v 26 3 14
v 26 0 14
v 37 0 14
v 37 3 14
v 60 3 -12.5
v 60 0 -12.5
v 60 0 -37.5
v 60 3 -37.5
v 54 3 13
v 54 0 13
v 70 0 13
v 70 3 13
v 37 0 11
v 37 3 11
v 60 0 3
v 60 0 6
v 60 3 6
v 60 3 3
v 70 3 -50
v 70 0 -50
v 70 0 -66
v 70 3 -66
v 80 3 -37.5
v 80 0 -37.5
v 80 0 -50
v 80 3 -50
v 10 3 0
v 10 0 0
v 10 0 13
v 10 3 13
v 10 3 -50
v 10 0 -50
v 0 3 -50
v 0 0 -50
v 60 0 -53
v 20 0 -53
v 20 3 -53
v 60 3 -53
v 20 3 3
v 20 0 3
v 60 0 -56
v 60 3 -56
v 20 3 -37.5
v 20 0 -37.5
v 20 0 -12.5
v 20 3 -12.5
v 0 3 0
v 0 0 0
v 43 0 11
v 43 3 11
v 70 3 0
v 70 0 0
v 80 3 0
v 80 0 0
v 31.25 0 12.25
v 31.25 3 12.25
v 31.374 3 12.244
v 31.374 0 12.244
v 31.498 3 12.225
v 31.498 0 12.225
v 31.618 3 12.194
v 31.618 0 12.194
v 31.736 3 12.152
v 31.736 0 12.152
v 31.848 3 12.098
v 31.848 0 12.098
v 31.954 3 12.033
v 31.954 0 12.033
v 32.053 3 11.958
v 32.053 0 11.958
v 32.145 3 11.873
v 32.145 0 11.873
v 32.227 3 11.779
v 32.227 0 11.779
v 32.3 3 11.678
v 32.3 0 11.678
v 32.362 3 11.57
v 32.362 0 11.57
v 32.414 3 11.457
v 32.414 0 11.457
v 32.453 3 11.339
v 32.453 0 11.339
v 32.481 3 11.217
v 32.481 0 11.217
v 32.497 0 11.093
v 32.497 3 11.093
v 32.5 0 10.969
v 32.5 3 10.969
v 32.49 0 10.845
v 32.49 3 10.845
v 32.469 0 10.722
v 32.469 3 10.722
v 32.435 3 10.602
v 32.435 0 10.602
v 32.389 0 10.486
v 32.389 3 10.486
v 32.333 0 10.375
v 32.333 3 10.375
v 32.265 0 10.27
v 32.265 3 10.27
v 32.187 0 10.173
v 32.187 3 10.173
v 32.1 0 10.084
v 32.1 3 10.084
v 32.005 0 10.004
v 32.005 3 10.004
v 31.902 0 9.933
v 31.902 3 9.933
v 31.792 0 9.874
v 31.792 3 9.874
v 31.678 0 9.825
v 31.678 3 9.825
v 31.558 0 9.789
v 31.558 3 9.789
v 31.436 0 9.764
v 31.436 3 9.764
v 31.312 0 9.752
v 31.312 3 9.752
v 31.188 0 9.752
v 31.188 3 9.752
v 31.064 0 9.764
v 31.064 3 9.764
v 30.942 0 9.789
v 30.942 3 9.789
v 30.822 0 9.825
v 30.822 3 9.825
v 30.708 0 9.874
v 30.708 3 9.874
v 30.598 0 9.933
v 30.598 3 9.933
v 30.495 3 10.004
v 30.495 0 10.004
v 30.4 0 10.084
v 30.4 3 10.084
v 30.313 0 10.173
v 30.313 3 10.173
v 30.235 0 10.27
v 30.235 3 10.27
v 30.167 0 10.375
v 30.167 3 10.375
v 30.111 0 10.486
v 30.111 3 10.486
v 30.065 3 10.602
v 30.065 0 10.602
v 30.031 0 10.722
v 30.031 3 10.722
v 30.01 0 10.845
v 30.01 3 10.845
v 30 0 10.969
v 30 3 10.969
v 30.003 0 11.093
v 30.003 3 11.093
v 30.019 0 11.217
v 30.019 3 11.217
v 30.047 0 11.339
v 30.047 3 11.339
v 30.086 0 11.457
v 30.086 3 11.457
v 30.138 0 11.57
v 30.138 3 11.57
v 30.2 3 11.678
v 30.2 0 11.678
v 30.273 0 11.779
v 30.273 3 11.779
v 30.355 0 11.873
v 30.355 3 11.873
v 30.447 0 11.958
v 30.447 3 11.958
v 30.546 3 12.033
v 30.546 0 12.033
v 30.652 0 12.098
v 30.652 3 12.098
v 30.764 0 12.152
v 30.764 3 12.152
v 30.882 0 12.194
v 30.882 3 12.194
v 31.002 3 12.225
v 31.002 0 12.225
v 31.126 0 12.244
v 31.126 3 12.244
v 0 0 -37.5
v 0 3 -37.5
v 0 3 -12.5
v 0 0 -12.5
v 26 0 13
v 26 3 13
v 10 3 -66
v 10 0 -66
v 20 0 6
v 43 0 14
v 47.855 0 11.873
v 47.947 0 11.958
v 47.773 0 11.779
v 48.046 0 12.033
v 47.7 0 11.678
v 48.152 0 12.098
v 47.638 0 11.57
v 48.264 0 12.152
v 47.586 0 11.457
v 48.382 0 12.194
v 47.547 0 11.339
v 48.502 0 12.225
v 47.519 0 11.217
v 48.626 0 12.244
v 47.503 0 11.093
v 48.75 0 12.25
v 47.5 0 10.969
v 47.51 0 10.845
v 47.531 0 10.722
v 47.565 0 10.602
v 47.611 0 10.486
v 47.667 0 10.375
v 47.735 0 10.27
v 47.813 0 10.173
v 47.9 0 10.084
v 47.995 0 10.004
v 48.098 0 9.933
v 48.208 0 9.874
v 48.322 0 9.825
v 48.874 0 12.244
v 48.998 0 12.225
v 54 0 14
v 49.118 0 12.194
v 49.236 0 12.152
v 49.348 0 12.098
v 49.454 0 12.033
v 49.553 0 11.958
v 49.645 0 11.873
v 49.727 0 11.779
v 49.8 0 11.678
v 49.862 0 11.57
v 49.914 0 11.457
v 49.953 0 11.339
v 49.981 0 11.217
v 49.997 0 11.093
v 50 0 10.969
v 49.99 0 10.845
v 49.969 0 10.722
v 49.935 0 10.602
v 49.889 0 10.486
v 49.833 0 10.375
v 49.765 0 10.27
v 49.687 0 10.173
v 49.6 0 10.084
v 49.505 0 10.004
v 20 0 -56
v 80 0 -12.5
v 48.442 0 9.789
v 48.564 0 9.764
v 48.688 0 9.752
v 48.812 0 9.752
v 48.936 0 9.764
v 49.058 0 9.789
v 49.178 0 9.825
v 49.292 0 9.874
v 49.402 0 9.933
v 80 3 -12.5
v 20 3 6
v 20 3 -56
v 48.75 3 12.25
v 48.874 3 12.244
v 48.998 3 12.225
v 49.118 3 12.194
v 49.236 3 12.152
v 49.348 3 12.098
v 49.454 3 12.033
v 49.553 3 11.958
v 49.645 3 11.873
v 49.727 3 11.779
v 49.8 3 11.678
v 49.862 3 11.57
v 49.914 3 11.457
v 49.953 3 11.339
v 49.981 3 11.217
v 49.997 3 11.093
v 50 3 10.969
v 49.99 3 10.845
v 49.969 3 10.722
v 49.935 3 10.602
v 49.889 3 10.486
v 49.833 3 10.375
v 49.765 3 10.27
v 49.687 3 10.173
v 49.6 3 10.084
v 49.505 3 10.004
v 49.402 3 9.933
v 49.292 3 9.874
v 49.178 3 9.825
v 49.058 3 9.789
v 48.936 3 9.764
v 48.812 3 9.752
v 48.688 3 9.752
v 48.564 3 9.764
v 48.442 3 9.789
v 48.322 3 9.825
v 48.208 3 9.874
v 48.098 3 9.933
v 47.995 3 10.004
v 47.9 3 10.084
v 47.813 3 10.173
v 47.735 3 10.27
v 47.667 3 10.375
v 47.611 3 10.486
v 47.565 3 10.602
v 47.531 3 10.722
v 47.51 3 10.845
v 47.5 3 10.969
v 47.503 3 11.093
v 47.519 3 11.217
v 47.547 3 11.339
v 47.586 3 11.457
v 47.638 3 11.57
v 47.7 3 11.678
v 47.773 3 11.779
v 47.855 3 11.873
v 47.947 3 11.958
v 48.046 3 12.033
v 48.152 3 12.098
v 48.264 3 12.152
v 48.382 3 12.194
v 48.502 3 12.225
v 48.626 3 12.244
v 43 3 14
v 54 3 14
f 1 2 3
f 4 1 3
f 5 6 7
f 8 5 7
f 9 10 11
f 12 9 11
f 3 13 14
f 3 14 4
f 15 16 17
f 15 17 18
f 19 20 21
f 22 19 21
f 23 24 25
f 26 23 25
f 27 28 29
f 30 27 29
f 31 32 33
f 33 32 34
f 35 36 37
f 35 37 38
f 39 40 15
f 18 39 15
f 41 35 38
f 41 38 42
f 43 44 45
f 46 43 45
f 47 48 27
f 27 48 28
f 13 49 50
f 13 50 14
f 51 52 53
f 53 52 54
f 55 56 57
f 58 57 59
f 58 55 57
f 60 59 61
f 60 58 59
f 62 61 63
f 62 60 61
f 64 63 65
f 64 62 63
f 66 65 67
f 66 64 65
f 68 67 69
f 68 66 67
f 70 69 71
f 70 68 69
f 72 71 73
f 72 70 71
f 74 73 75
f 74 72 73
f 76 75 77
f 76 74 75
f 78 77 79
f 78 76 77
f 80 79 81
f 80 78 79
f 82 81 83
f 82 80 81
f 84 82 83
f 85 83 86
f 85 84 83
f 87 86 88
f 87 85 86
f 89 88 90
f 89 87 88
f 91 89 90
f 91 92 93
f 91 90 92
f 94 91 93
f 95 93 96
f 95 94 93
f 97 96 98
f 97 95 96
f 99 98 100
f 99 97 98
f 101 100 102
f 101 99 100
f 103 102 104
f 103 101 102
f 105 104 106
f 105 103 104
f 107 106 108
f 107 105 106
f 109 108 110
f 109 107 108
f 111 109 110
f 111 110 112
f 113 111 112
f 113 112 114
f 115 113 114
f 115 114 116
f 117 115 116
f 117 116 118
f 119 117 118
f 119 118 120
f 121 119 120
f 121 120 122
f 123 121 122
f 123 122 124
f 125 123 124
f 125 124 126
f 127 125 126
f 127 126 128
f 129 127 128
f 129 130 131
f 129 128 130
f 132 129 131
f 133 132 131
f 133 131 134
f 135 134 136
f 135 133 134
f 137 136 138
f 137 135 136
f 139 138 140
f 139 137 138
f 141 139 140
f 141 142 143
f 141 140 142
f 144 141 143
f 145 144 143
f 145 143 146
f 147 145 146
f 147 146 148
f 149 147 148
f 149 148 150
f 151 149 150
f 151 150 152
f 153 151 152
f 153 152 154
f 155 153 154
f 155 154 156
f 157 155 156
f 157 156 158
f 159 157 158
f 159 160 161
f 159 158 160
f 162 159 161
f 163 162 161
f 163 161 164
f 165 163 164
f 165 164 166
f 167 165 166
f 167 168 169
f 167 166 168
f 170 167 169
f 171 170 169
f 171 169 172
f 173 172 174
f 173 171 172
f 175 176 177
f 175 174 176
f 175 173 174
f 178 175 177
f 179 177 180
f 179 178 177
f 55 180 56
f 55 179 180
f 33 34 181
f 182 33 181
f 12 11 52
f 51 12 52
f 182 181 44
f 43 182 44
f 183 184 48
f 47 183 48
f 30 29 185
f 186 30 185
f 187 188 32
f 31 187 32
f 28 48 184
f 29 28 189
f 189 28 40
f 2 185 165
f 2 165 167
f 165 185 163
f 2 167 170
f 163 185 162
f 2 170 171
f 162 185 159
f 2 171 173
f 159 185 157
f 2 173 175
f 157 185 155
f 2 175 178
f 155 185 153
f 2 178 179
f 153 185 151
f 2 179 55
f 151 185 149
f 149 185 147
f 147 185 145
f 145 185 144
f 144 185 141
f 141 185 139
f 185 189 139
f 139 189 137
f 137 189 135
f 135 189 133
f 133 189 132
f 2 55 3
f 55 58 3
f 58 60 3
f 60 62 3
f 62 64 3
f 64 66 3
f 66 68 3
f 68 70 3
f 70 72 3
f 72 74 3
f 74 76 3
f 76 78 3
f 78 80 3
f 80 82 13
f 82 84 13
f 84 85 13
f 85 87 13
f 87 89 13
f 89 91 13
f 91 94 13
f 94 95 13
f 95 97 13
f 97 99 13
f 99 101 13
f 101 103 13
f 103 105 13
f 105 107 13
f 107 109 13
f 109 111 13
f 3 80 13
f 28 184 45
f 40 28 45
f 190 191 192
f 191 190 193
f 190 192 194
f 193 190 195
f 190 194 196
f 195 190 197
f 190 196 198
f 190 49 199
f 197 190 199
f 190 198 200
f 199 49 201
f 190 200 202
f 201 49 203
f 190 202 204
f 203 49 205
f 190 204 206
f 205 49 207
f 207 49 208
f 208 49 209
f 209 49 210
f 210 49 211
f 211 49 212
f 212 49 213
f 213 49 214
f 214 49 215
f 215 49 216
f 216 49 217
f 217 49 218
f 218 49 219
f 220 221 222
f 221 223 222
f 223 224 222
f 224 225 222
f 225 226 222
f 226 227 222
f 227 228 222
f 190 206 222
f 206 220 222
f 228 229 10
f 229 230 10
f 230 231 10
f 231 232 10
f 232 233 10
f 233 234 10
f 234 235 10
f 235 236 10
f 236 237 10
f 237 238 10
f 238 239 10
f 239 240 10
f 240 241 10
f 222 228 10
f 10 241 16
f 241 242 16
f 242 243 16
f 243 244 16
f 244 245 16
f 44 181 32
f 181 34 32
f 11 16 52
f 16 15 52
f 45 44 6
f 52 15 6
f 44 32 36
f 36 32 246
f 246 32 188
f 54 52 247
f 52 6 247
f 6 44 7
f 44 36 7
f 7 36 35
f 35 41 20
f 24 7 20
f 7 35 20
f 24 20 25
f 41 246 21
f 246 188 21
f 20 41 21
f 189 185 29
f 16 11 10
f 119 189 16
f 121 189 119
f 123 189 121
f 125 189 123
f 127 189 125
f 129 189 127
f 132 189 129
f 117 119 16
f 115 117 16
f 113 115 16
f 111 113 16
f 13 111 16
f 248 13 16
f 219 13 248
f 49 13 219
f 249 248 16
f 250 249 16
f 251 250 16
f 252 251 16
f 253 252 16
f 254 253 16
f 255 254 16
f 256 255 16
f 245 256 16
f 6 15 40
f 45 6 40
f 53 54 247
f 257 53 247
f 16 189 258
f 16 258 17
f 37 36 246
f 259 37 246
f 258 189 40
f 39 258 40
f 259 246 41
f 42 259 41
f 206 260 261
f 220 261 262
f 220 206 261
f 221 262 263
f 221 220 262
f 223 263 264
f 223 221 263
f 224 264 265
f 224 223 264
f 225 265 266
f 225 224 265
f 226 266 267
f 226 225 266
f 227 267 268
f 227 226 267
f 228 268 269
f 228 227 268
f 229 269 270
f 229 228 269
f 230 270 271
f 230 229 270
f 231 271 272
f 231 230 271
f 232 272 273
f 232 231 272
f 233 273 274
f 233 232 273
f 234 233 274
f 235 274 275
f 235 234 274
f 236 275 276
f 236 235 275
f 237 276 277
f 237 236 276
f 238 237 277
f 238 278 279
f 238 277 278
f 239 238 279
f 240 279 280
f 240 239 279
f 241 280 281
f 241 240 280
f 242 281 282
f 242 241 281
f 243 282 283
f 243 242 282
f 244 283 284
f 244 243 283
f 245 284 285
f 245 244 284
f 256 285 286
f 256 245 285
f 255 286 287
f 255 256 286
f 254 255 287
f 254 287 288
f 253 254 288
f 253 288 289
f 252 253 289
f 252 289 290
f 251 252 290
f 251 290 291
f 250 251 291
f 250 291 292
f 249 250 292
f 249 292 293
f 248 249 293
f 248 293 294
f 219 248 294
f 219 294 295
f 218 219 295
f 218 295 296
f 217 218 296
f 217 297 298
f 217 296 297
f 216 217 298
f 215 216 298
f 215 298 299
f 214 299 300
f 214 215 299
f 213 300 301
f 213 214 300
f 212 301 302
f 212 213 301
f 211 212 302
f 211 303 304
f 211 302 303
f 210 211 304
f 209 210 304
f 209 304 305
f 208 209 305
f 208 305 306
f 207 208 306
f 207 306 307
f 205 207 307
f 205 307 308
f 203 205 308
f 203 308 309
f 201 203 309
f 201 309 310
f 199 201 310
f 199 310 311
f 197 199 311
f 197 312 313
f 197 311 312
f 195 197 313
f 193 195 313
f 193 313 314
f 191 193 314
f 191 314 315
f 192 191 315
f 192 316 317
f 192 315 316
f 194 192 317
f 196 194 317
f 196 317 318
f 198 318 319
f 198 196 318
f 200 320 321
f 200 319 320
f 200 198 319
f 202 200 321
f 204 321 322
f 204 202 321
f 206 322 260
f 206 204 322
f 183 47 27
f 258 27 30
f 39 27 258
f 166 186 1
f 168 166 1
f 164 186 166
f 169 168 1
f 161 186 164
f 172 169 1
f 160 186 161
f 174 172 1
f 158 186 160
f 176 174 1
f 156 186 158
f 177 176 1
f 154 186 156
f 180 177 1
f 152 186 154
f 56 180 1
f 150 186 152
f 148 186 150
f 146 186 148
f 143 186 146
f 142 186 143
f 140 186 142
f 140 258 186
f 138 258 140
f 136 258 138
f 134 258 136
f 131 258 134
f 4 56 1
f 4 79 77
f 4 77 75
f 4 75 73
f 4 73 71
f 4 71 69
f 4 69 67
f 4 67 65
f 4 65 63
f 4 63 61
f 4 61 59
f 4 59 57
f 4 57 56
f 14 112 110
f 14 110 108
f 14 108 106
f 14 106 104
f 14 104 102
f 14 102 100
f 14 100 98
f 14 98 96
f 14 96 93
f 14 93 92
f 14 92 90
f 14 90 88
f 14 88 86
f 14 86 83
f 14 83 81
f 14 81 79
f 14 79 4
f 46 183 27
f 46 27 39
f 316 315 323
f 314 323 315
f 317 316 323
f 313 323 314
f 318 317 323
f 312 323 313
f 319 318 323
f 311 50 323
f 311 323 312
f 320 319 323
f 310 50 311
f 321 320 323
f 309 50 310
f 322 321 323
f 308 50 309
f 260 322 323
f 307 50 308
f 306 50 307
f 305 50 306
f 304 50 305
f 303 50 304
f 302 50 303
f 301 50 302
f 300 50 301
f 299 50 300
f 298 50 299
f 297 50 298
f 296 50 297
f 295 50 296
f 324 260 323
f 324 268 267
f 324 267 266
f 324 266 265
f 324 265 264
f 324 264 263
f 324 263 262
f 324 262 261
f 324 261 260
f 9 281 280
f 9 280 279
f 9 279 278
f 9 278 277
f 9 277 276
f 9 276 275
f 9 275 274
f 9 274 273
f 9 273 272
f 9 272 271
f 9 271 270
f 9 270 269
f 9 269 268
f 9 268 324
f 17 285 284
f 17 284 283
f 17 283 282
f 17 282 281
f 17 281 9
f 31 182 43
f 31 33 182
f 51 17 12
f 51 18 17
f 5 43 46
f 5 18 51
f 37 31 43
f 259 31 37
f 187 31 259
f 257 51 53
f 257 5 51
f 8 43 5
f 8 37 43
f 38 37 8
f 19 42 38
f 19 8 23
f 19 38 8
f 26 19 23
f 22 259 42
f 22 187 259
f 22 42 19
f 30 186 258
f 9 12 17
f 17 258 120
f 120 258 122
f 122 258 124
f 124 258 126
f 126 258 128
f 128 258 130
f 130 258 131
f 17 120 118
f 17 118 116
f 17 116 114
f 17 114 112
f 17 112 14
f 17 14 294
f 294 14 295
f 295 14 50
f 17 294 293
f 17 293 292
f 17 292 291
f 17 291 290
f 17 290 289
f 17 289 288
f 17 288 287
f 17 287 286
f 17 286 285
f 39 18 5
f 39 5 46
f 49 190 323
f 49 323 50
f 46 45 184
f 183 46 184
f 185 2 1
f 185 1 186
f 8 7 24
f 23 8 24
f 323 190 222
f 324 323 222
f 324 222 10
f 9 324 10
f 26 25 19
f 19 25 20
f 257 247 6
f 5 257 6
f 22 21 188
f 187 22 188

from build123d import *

# Parameters (mm, degrees)
SKETCH1_W           = 40
SKETCH1_H           = 3
BOSS_EXTRUDE1_DEPTH = 3
SKETCH2_R           = 1.25
CUT_EXTRUDE1_DEPTH  = 10
SKETCH3_W           = 16
SKETCH3_H           = 3
SKETCH3_W_2         = 11
SKETCH3_H_2         = 2.000440009
CUT_EXTRUDE2_DEPTH  = 10


with BuildPart() as part:
    # Sketch1 → Boss-Extrude1 (new body)
    with BuildSketch(Plane(origin=(0, 0, 0), x_dir=(1, 0, 0), z_dir=(0, 1, 0))):
        Polygon((20, 37.5), (20, 12.5), (0, 12.5), (0, 0), (10, 0), (10, -16), (70, -16), (70, 0), (80, 0), (80, 12.5), (60, 12.5), (60, 37.5), (80, 37.5), (80, 50), (70, 50), (70, 66), (10, 66), (10, 50), (0, 50), (0, 37.5), align=None)
        with Locations((40, -4.5)):
            Rectangle(SKETCH1_W, SKETCH1_H, mode=Mode.SUBTRACT)
        with Locations((40, 54.5)):
            Rectangle(SKETCH1_W, SKETCH1_H, mode=Mode.SUBTRACT)
    extrude(amount=BOSS_EXTRUDE1_DEPTH)

    # Sketch2 → Cut-Extrude1 (cut)
    with BuildSketch(Plane(origin=(0, 0, 0), x_dir=(1, 0, 0), z_dir=(0, 1, 0))):
        with Locations(Location((31.25, -11, 0), (0, 0, 270))):
            Circle(SKETCH2_R)
        with Locations(Location((48.75, -11, 0), (0, 0, 270))):
            Circle(SKETCH2_R)
    extrude(amount=CUT_EXTRUDE1_DEPTH, mode=Mode.SUBTRACT)

    # Sketch3 → Cut-Extrude2 (cut)
    with BuildSketch(Plane(origin=(0, 0, 0), x_dir=(1, 0, 0), z_dir=(0, 1, 0))):
        with Locations((18, -14.5)):
            Rectangle(SKETCH3_W, SKETCH3_H)
        Polygon((37, -16), (40, -16), (40, -11), (37, -11), (37, -13.999559991), align=None)
        Polygon((40, -11), (40, -16), (43, -16), (43, -13.999559991), (43, -11), align=None)
        with Locations((62, -14.5)):
            Rectangle(SKETCH3_W, SKETCH3_H)
        with Locations((31.5, -14.999779996)):
            Rectangle(SKETCH3_W_2, SKETCH3_H_2)
        with Locations((48.5, -14.999779996)):
            Rectangle(SKETCH3_W_2, SKETCH3_H_2)
    extrude(amount=CUT_EXTRUDE2_DEPTH, mode=Mode.SUBTRACT)


solid = part.part
